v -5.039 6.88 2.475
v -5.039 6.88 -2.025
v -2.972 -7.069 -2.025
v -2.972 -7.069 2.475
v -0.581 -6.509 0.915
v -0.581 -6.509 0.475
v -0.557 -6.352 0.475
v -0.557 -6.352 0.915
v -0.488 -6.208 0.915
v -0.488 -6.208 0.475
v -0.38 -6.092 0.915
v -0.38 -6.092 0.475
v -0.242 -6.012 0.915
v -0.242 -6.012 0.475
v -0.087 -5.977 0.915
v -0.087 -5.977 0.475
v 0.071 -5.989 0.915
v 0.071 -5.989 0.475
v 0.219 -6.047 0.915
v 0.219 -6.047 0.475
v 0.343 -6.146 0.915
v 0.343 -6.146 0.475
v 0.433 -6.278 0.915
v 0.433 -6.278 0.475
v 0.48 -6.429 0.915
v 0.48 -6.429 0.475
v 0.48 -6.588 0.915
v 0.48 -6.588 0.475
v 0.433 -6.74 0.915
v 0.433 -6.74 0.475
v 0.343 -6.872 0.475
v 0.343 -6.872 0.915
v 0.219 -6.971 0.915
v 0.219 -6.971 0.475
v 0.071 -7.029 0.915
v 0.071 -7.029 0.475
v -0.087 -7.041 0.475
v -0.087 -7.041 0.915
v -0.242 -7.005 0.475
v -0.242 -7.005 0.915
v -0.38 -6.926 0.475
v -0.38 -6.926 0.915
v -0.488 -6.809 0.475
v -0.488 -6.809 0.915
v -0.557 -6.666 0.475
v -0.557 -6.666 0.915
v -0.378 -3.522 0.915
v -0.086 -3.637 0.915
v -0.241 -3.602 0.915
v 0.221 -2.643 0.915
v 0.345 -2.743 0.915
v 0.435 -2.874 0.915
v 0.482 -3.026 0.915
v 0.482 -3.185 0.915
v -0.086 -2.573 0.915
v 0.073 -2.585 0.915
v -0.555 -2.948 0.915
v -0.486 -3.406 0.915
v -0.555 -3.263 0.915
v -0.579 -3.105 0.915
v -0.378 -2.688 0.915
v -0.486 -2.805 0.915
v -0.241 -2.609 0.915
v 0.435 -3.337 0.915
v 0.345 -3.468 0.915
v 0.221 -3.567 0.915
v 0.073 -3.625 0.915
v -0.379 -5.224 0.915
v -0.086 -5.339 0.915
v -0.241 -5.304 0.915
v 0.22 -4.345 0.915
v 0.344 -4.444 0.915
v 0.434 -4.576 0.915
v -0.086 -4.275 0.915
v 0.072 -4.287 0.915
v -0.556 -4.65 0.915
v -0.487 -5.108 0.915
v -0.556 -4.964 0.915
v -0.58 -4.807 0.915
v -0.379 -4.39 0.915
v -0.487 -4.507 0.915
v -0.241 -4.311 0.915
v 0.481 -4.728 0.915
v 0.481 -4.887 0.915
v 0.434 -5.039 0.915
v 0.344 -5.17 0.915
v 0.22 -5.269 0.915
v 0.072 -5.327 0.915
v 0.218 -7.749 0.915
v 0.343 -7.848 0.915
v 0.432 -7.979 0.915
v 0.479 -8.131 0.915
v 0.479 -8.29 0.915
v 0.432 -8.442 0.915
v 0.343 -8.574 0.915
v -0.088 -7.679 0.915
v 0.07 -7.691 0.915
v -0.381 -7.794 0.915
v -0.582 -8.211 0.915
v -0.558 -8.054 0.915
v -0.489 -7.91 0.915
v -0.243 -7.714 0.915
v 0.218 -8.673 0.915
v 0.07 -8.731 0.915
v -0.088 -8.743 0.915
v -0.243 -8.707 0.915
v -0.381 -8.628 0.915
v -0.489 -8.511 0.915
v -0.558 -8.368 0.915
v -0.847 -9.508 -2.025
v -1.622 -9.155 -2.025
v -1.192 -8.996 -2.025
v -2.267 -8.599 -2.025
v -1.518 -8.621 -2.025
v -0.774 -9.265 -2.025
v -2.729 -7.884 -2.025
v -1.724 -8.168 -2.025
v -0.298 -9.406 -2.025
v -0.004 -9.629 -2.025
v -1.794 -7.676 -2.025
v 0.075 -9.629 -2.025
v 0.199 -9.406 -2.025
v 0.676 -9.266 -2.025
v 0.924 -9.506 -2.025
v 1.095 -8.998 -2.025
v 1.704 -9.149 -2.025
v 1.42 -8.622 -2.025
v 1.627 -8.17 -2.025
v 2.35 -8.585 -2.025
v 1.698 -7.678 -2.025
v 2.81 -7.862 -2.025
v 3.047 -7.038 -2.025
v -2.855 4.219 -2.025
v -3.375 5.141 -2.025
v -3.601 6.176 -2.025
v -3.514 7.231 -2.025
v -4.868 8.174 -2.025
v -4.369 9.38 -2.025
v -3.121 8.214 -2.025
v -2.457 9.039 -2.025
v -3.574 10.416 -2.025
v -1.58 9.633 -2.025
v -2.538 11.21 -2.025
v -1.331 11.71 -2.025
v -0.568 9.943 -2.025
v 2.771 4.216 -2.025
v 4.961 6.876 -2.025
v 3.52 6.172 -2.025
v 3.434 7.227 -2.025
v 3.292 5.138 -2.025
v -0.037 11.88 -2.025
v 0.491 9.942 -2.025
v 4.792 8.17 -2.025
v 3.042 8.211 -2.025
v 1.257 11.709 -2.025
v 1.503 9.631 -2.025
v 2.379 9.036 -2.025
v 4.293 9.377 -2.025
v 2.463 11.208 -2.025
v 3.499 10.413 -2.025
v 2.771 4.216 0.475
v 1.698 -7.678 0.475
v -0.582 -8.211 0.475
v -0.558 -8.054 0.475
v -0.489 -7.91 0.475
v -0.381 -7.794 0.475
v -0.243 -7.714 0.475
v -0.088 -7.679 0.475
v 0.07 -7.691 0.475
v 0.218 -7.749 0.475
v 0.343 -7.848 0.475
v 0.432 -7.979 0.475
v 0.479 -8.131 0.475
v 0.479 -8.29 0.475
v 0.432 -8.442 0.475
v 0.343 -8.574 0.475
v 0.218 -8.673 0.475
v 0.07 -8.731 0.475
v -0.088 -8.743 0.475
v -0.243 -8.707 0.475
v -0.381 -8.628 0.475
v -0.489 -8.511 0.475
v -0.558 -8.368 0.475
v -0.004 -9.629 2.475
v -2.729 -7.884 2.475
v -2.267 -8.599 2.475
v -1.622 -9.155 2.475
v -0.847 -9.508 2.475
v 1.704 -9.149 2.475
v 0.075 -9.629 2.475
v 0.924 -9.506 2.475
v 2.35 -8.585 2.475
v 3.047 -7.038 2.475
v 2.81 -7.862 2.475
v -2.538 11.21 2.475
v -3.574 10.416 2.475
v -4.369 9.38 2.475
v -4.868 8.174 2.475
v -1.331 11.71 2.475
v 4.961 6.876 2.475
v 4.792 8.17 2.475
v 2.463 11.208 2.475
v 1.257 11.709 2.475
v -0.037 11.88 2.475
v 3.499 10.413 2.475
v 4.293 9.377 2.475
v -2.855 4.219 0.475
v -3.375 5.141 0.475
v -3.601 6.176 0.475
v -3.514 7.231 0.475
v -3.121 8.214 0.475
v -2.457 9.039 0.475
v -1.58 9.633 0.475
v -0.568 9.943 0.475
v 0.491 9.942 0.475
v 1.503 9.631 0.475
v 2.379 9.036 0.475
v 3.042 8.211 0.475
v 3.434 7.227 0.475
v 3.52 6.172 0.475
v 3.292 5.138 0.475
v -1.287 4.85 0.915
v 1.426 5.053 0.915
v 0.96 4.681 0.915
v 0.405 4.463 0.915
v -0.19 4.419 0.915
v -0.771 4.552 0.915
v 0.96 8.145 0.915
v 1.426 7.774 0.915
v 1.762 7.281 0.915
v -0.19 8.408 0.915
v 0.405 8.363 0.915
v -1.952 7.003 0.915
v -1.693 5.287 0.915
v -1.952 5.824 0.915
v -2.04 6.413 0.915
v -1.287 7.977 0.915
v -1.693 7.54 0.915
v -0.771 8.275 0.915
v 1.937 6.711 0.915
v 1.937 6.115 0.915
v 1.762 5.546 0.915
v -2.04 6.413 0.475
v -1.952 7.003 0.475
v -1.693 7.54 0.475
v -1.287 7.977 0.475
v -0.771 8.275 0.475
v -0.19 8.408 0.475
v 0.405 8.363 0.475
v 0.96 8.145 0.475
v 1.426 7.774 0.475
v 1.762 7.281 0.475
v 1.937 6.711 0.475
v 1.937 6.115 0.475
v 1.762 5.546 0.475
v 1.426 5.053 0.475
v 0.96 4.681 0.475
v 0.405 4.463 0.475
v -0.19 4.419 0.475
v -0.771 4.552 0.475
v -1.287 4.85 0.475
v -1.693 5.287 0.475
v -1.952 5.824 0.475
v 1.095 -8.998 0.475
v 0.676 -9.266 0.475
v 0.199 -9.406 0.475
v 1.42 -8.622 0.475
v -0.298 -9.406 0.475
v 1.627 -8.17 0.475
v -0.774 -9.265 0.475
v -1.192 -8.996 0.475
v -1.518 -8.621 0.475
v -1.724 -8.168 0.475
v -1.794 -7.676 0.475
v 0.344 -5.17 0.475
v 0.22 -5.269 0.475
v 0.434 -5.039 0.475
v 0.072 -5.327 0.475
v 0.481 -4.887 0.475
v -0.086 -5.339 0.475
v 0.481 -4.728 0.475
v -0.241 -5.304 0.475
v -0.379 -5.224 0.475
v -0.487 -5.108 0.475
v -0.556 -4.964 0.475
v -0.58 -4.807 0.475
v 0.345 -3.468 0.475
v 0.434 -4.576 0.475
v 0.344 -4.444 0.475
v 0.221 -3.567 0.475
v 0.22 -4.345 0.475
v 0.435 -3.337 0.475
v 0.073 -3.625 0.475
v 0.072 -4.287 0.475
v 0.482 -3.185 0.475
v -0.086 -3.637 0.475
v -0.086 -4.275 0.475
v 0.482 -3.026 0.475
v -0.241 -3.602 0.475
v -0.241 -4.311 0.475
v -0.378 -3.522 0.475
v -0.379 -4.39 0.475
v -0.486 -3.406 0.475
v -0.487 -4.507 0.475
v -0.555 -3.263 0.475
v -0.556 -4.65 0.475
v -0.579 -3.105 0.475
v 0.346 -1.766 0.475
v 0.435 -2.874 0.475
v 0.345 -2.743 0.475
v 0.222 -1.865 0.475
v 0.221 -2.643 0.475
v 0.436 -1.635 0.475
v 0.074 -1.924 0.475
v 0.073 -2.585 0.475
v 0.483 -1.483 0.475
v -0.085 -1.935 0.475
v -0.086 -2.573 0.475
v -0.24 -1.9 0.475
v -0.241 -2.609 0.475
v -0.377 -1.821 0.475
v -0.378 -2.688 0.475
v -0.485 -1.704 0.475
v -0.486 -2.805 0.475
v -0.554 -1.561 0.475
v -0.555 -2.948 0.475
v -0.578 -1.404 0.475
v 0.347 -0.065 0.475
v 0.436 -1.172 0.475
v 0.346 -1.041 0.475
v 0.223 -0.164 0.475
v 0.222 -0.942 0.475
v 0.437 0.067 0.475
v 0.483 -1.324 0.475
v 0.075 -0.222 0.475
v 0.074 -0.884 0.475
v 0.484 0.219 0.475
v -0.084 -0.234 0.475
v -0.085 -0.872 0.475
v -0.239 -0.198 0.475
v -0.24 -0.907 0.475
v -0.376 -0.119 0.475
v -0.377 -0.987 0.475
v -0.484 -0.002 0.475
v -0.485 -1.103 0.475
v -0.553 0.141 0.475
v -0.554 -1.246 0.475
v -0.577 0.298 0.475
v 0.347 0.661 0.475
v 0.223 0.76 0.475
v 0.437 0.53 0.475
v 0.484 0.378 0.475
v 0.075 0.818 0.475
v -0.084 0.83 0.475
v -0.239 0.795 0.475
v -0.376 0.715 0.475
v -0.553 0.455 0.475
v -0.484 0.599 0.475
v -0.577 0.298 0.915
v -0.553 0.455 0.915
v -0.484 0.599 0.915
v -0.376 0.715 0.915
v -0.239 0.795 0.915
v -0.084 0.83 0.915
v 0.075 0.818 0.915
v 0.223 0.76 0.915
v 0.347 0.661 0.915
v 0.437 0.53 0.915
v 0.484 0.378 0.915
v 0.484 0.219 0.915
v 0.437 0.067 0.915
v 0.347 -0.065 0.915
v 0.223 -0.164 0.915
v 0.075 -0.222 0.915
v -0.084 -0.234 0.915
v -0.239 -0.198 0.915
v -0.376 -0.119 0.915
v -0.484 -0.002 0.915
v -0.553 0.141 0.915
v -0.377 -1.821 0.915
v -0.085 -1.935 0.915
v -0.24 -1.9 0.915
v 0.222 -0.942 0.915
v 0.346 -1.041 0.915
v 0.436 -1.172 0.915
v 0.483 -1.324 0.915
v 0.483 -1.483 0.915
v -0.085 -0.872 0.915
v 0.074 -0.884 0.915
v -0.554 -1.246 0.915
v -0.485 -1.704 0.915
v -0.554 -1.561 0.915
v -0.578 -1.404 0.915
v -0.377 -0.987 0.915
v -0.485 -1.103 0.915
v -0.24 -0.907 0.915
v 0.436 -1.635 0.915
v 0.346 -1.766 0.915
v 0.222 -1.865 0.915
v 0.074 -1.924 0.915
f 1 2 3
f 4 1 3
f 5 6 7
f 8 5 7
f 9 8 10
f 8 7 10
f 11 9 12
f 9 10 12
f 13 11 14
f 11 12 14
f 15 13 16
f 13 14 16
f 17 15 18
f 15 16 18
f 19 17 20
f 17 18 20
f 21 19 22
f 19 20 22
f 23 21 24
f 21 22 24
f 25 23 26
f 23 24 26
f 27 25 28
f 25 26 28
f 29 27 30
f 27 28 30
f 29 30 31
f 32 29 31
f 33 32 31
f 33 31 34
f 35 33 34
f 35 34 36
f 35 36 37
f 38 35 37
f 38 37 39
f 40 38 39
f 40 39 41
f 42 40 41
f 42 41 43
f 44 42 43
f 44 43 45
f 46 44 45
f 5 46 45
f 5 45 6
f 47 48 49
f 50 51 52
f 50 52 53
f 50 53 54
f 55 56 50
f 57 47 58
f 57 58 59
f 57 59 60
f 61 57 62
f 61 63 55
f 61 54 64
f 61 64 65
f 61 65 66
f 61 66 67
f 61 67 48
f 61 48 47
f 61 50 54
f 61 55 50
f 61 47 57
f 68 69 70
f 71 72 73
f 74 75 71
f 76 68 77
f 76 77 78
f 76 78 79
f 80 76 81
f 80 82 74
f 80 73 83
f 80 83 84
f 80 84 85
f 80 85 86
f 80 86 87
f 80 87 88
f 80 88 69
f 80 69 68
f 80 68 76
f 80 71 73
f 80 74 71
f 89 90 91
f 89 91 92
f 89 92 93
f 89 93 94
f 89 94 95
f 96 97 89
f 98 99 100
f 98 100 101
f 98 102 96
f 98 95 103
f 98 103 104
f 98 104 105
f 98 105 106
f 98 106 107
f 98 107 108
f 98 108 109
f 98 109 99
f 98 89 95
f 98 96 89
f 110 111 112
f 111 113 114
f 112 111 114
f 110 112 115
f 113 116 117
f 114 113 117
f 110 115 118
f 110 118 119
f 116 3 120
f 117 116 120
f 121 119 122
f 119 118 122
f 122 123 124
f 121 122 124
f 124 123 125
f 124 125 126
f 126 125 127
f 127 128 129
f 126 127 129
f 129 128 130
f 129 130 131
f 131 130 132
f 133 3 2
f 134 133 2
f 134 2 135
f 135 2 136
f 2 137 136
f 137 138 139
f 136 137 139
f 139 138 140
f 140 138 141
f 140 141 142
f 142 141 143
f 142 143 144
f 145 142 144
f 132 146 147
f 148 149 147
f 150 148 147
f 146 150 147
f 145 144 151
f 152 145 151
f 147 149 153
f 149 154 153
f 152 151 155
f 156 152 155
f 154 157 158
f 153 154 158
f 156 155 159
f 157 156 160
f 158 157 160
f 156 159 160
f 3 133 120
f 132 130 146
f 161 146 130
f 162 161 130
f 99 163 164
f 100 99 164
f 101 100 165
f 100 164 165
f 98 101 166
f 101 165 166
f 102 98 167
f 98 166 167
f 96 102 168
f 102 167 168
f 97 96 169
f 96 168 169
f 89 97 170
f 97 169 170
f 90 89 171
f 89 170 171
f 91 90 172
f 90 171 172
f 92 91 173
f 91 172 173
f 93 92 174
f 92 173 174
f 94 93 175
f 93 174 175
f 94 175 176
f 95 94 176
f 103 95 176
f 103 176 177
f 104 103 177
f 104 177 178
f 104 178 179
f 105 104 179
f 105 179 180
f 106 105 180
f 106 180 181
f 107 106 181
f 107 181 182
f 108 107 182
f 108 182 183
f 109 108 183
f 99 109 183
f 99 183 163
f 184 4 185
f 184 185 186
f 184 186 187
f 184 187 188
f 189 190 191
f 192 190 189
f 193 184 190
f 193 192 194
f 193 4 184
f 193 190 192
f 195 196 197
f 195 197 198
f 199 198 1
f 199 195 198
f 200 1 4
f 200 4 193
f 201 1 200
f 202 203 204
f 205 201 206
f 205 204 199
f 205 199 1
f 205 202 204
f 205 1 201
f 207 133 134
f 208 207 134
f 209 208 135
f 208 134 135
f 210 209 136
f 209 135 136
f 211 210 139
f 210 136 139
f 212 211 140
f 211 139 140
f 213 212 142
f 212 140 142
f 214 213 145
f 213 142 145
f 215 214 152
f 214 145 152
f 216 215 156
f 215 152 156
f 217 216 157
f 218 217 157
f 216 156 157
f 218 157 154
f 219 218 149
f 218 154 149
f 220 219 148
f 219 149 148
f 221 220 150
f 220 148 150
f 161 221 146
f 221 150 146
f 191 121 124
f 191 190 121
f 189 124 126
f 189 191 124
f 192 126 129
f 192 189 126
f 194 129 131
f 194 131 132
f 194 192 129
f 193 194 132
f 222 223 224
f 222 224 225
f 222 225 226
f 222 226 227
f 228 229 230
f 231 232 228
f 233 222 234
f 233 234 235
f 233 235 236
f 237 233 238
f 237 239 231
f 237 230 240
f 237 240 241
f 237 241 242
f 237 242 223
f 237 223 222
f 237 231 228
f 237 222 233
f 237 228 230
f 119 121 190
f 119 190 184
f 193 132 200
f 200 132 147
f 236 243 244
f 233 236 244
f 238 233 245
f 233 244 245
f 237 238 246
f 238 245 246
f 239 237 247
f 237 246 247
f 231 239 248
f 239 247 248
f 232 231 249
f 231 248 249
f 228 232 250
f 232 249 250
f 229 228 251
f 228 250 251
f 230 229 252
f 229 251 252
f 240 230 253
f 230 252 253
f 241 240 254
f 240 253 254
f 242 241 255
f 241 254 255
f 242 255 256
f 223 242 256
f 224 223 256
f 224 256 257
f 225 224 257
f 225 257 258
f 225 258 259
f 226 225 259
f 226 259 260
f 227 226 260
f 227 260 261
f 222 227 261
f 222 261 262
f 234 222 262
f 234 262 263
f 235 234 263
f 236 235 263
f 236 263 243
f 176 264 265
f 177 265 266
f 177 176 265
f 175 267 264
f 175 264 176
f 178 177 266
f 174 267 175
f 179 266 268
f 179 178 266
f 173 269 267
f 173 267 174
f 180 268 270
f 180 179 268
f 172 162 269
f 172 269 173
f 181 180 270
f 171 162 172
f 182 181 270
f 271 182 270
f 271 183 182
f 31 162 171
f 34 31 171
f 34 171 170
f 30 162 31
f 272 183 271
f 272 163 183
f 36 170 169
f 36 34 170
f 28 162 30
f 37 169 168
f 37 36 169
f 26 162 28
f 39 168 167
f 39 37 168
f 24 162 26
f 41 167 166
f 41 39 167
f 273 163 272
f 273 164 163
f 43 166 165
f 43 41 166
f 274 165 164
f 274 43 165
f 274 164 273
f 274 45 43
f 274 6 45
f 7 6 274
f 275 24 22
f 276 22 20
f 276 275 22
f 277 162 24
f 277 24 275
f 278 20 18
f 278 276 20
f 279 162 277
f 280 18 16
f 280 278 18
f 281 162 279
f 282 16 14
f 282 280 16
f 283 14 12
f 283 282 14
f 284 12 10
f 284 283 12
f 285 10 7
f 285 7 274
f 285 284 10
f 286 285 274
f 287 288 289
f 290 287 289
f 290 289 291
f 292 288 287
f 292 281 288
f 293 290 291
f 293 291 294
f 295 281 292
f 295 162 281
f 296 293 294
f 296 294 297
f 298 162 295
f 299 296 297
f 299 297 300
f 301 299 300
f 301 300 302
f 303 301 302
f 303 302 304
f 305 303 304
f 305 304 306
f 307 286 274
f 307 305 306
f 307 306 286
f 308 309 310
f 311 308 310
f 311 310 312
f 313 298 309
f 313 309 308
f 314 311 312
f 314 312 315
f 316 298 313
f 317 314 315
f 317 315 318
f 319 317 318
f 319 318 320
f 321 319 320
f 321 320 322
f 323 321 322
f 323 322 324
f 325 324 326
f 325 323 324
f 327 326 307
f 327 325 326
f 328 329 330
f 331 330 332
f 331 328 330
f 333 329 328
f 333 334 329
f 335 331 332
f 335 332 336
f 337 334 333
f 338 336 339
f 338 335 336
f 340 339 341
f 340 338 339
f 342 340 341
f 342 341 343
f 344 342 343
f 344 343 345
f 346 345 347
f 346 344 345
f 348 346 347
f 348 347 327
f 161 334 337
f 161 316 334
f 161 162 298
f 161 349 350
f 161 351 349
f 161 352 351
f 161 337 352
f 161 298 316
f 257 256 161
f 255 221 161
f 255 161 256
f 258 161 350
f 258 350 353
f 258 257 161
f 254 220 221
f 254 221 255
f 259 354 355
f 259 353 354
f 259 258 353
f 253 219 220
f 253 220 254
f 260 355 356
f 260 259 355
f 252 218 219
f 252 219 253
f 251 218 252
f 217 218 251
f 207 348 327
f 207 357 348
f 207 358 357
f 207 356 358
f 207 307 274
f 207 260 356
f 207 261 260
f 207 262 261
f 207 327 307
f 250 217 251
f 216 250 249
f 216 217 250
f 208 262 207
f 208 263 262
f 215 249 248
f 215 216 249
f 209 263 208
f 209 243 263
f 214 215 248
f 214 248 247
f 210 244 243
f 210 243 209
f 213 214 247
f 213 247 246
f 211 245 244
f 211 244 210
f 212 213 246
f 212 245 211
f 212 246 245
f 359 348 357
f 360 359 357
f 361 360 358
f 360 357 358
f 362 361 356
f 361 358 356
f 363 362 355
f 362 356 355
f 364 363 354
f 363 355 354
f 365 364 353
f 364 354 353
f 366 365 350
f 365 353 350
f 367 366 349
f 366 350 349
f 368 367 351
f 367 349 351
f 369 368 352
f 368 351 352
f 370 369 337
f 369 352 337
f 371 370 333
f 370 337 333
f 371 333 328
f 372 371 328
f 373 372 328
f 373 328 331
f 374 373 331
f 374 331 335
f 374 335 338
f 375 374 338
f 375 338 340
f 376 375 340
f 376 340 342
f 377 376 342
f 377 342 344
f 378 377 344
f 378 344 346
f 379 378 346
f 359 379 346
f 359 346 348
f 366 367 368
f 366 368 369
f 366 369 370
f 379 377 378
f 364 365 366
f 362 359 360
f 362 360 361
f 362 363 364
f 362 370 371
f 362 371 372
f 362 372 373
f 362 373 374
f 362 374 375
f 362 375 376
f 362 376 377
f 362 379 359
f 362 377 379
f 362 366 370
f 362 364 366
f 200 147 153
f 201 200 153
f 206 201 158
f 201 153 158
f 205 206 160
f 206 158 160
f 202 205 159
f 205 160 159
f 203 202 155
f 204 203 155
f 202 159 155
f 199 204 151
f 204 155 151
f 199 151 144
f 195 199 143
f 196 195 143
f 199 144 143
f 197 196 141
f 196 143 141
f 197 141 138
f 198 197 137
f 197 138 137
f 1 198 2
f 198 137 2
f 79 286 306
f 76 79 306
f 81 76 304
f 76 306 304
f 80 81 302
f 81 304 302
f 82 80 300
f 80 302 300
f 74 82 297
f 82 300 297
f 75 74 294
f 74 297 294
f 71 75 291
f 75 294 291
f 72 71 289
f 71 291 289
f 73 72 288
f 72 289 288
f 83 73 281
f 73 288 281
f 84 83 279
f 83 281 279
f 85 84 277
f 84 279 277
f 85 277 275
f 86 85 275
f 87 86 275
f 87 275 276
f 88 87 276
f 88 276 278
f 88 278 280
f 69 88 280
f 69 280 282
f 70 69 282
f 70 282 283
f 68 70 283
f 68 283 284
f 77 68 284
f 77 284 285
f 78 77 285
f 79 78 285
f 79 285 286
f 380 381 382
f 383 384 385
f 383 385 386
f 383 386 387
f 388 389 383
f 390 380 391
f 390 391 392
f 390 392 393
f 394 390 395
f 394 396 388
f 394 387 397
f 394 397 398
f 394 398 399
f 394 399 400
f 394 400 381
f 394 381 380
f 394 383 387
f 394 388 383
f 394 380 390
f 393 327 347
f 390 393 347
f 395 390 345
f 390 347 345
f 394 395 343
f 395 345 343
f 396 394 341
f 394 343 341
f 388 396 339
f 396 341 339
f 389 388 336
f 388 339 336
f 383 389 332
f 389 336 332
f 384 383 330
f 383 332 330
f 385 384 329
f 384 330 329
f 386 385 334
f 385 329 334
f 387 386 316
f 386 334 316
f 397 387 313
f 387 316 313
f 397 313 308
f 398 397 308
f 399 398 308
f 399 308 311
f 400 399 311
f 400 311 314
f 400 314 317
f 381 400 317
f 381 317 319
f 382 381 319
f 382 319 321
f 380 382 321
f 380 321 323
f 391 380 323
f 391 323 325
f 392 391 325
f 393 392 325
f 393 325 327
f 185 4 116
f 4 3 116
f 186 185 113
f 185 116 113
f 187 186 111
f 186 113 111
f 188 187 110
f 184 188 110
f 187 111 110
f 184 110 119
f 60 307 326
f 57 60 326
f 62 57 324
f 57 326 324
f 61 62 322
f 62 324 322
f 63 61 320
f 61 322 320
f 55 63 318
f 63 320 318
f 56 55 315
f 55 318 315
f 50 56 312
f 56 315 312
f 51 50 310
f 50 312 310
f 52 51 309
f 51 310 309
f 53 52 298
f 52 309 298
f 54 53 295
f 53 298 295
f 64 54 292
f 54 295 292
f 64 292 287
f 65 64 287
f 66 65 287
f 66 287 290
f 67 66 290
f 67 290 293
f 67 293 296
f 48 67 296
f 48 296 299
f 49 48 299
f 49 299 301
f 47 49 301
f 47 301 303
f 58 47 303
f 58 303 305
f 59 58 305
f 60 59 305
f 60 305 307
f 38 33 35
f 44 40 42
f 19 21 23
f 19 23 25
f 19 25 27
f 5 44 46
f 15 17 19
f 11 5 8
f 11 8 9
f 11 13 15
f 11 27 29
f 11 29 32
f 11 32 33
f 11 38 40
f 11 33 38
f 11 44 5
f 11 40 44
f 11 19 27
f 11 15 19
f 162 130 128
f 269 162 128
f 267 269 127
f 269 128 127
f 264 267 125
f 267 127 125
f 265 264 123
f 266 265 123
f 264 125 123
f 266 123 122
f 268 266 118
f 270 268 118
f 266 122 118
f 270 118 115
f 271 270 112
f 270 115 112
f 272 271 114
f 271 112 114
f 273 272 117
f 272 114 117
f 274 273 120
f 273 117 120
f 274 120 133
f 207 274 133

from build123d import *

# Parameters (mm, degrees)
BOSS_EXTRUDE1_DEPTH = 0.45
SCALE2_SCALE        = 10
SKETCH4_R           = 0.5334
SKETCH4_R_2         = 2
CUT_EXTRUDE5_DEPTH  = 2.94
SKETCH4_3_R         = 0.5334
SKETCH4_3_R_2       = 2
CUT_EXTRUDE6_DEPTH  = 2.5
CUT_EXTRUDE7_DEPTH  = 4.5
FILLET5_R           = 3


with BuildPart() as part:
    # Sketch1 → Boss-Extrude1 (new body)
    with BuildSketch(Plane.XY):
        with BuildLine():
            Line((-0.136993219, -2.45), (0.163006781, -2.450375949))
            Line((0.163006781, -2.450375949), (0.499999859, -0.000375949))
            ThreePointArc((0.499999859, -0.000375949), (0.000187974, 0.499999965), (-0.5, 0))
            Line((-0.5, 0), (-0.136993219, -2.45))
        make_face()
    extrude(amount=BOSS_EXTRUDE1_DEPTH)


with BuildPart() as part_1:
    # Scale2: scaled about (0.004303075, -0.764400295, 0.225)
    add(part.part.scale(SCALE2_SCALE).moved(Location((-0.038727675, 6.879602655, -2.025))))

    # Sketch4 → Cut-Extrude5 (cut)
    with BuildSketch(Plane(origin=(0, 0, -2.025), x_dir=(-1, 0, 0), z_dir=(0, 0, -1))):
        with Locations((0.043782342, 0.298259193)):
            Circle(SKETCH4_R)
        with Locations((0.044722007, -1.403540547)):
            Circle(SKETCH4_R)
        with Locations((0.045661673, -3.105340288)):
            Circle(SKETCH4_R)
        with Locations((0.046601338, -4.807140028)):
            Circle(SKETCH4_R)
        with Locations((0.047541004, -6.508939769)):
            Circle(SKETCH4_R)
        with Locations((0.048480669, -8.21073951)):
            Circle(SKETCH4_R)
        with Locations((0.040405857, 6.413308261)):
            Circle(SKETCH4_R_2)
    extrude(amount=-CUT_EXTRUDE5_DEPTH, mode=Mode.SUBTRACT)

    # Sketch4<3> → Cut-Extrude6 (cut)
    with BuildSketch(Plane(origin=(0, 0, -2.025), x_dir=(-1, 0, 0), z_dir=(0, 0, -1))):
        with BuildLine():
            Line((1.794435881, -7.676375382), (2.854667965, 4.218872462))
            ThreePointArc((2.854667965, 4.218872462), (0.038435364, 9.982007717), (-2.771431177, 4.215765956))
            Line((-2.771431177, 4.215765956), (-1.698063587, -7.6783038))
            ThreePointArc((-1.698063587, -7.6783038), (0.049150356, -9.423589325), (1.794435881, -7.676375382))
        make_face()
        with Locations((0.043782342, 0.298259193)):
            Circle(SKETCH4_3_R, mode=Mode.SUBTRACT)
        with Locations((0.044722007, -1.403540547)):
            Circle(SKETCH4_3_R, mode=Mode.SUBTRACT)
        with Locations((0.045661673, -3.105340288)):
            Circle(SKETCH4_3_R, mode=Mode.SUBTRACT)
        with Locations((0.046601338, -4.807140028)):
            Circle(SKETCH4_3_R, mode=Mode.SUBTRACT)
        with Locations((0.047541004, -6.508939769)):
            Circle(SKETCH4_3_R, mode=Mode.SUBTRACT)
        with Locations((0.048480669, -8.21073951)):
            Circle(SKETCH4_3_R, mode=Mode.SUBTRACT)
        with Locations((0.040405857, 6.413308261)):
            Circle(SKETCH4_3_R_2, mode=Mode.SUBTRACT)
    extrude(amount=-CUT_EXTRUDE6_DEPTH, mode=Mode.SUBTRACT)

    # Sketch5 → Cut-Extrude7 (cut)
    with BuildSketch(Plane(origin=(0, 0, -2.025), x_dir=(-1, 0, 0), z_dir=(0, 0, -1))):
        Polygon((-2.691750397, -9.628866056), (2.593406399, -9.628866056), (1.408635162, -17.625106571), (-1.591364838, -17.628866056), align=None)
    extrude(amount=-CUT_EXTRUDE7_DEPTH, mode=Mode.SUBTRACT)

    # Fillet5
    fillet5_edges = [part_1.edges().sort_by_distance(p)[0] for p in [
        (-2.592733353, -9.628866056, 0.225),
        (2.691077951, -9.628866056, 0.225),
    ]]
    fillet(fillet5_edges, radius=FILLET5_R)


solid = part_1.part
